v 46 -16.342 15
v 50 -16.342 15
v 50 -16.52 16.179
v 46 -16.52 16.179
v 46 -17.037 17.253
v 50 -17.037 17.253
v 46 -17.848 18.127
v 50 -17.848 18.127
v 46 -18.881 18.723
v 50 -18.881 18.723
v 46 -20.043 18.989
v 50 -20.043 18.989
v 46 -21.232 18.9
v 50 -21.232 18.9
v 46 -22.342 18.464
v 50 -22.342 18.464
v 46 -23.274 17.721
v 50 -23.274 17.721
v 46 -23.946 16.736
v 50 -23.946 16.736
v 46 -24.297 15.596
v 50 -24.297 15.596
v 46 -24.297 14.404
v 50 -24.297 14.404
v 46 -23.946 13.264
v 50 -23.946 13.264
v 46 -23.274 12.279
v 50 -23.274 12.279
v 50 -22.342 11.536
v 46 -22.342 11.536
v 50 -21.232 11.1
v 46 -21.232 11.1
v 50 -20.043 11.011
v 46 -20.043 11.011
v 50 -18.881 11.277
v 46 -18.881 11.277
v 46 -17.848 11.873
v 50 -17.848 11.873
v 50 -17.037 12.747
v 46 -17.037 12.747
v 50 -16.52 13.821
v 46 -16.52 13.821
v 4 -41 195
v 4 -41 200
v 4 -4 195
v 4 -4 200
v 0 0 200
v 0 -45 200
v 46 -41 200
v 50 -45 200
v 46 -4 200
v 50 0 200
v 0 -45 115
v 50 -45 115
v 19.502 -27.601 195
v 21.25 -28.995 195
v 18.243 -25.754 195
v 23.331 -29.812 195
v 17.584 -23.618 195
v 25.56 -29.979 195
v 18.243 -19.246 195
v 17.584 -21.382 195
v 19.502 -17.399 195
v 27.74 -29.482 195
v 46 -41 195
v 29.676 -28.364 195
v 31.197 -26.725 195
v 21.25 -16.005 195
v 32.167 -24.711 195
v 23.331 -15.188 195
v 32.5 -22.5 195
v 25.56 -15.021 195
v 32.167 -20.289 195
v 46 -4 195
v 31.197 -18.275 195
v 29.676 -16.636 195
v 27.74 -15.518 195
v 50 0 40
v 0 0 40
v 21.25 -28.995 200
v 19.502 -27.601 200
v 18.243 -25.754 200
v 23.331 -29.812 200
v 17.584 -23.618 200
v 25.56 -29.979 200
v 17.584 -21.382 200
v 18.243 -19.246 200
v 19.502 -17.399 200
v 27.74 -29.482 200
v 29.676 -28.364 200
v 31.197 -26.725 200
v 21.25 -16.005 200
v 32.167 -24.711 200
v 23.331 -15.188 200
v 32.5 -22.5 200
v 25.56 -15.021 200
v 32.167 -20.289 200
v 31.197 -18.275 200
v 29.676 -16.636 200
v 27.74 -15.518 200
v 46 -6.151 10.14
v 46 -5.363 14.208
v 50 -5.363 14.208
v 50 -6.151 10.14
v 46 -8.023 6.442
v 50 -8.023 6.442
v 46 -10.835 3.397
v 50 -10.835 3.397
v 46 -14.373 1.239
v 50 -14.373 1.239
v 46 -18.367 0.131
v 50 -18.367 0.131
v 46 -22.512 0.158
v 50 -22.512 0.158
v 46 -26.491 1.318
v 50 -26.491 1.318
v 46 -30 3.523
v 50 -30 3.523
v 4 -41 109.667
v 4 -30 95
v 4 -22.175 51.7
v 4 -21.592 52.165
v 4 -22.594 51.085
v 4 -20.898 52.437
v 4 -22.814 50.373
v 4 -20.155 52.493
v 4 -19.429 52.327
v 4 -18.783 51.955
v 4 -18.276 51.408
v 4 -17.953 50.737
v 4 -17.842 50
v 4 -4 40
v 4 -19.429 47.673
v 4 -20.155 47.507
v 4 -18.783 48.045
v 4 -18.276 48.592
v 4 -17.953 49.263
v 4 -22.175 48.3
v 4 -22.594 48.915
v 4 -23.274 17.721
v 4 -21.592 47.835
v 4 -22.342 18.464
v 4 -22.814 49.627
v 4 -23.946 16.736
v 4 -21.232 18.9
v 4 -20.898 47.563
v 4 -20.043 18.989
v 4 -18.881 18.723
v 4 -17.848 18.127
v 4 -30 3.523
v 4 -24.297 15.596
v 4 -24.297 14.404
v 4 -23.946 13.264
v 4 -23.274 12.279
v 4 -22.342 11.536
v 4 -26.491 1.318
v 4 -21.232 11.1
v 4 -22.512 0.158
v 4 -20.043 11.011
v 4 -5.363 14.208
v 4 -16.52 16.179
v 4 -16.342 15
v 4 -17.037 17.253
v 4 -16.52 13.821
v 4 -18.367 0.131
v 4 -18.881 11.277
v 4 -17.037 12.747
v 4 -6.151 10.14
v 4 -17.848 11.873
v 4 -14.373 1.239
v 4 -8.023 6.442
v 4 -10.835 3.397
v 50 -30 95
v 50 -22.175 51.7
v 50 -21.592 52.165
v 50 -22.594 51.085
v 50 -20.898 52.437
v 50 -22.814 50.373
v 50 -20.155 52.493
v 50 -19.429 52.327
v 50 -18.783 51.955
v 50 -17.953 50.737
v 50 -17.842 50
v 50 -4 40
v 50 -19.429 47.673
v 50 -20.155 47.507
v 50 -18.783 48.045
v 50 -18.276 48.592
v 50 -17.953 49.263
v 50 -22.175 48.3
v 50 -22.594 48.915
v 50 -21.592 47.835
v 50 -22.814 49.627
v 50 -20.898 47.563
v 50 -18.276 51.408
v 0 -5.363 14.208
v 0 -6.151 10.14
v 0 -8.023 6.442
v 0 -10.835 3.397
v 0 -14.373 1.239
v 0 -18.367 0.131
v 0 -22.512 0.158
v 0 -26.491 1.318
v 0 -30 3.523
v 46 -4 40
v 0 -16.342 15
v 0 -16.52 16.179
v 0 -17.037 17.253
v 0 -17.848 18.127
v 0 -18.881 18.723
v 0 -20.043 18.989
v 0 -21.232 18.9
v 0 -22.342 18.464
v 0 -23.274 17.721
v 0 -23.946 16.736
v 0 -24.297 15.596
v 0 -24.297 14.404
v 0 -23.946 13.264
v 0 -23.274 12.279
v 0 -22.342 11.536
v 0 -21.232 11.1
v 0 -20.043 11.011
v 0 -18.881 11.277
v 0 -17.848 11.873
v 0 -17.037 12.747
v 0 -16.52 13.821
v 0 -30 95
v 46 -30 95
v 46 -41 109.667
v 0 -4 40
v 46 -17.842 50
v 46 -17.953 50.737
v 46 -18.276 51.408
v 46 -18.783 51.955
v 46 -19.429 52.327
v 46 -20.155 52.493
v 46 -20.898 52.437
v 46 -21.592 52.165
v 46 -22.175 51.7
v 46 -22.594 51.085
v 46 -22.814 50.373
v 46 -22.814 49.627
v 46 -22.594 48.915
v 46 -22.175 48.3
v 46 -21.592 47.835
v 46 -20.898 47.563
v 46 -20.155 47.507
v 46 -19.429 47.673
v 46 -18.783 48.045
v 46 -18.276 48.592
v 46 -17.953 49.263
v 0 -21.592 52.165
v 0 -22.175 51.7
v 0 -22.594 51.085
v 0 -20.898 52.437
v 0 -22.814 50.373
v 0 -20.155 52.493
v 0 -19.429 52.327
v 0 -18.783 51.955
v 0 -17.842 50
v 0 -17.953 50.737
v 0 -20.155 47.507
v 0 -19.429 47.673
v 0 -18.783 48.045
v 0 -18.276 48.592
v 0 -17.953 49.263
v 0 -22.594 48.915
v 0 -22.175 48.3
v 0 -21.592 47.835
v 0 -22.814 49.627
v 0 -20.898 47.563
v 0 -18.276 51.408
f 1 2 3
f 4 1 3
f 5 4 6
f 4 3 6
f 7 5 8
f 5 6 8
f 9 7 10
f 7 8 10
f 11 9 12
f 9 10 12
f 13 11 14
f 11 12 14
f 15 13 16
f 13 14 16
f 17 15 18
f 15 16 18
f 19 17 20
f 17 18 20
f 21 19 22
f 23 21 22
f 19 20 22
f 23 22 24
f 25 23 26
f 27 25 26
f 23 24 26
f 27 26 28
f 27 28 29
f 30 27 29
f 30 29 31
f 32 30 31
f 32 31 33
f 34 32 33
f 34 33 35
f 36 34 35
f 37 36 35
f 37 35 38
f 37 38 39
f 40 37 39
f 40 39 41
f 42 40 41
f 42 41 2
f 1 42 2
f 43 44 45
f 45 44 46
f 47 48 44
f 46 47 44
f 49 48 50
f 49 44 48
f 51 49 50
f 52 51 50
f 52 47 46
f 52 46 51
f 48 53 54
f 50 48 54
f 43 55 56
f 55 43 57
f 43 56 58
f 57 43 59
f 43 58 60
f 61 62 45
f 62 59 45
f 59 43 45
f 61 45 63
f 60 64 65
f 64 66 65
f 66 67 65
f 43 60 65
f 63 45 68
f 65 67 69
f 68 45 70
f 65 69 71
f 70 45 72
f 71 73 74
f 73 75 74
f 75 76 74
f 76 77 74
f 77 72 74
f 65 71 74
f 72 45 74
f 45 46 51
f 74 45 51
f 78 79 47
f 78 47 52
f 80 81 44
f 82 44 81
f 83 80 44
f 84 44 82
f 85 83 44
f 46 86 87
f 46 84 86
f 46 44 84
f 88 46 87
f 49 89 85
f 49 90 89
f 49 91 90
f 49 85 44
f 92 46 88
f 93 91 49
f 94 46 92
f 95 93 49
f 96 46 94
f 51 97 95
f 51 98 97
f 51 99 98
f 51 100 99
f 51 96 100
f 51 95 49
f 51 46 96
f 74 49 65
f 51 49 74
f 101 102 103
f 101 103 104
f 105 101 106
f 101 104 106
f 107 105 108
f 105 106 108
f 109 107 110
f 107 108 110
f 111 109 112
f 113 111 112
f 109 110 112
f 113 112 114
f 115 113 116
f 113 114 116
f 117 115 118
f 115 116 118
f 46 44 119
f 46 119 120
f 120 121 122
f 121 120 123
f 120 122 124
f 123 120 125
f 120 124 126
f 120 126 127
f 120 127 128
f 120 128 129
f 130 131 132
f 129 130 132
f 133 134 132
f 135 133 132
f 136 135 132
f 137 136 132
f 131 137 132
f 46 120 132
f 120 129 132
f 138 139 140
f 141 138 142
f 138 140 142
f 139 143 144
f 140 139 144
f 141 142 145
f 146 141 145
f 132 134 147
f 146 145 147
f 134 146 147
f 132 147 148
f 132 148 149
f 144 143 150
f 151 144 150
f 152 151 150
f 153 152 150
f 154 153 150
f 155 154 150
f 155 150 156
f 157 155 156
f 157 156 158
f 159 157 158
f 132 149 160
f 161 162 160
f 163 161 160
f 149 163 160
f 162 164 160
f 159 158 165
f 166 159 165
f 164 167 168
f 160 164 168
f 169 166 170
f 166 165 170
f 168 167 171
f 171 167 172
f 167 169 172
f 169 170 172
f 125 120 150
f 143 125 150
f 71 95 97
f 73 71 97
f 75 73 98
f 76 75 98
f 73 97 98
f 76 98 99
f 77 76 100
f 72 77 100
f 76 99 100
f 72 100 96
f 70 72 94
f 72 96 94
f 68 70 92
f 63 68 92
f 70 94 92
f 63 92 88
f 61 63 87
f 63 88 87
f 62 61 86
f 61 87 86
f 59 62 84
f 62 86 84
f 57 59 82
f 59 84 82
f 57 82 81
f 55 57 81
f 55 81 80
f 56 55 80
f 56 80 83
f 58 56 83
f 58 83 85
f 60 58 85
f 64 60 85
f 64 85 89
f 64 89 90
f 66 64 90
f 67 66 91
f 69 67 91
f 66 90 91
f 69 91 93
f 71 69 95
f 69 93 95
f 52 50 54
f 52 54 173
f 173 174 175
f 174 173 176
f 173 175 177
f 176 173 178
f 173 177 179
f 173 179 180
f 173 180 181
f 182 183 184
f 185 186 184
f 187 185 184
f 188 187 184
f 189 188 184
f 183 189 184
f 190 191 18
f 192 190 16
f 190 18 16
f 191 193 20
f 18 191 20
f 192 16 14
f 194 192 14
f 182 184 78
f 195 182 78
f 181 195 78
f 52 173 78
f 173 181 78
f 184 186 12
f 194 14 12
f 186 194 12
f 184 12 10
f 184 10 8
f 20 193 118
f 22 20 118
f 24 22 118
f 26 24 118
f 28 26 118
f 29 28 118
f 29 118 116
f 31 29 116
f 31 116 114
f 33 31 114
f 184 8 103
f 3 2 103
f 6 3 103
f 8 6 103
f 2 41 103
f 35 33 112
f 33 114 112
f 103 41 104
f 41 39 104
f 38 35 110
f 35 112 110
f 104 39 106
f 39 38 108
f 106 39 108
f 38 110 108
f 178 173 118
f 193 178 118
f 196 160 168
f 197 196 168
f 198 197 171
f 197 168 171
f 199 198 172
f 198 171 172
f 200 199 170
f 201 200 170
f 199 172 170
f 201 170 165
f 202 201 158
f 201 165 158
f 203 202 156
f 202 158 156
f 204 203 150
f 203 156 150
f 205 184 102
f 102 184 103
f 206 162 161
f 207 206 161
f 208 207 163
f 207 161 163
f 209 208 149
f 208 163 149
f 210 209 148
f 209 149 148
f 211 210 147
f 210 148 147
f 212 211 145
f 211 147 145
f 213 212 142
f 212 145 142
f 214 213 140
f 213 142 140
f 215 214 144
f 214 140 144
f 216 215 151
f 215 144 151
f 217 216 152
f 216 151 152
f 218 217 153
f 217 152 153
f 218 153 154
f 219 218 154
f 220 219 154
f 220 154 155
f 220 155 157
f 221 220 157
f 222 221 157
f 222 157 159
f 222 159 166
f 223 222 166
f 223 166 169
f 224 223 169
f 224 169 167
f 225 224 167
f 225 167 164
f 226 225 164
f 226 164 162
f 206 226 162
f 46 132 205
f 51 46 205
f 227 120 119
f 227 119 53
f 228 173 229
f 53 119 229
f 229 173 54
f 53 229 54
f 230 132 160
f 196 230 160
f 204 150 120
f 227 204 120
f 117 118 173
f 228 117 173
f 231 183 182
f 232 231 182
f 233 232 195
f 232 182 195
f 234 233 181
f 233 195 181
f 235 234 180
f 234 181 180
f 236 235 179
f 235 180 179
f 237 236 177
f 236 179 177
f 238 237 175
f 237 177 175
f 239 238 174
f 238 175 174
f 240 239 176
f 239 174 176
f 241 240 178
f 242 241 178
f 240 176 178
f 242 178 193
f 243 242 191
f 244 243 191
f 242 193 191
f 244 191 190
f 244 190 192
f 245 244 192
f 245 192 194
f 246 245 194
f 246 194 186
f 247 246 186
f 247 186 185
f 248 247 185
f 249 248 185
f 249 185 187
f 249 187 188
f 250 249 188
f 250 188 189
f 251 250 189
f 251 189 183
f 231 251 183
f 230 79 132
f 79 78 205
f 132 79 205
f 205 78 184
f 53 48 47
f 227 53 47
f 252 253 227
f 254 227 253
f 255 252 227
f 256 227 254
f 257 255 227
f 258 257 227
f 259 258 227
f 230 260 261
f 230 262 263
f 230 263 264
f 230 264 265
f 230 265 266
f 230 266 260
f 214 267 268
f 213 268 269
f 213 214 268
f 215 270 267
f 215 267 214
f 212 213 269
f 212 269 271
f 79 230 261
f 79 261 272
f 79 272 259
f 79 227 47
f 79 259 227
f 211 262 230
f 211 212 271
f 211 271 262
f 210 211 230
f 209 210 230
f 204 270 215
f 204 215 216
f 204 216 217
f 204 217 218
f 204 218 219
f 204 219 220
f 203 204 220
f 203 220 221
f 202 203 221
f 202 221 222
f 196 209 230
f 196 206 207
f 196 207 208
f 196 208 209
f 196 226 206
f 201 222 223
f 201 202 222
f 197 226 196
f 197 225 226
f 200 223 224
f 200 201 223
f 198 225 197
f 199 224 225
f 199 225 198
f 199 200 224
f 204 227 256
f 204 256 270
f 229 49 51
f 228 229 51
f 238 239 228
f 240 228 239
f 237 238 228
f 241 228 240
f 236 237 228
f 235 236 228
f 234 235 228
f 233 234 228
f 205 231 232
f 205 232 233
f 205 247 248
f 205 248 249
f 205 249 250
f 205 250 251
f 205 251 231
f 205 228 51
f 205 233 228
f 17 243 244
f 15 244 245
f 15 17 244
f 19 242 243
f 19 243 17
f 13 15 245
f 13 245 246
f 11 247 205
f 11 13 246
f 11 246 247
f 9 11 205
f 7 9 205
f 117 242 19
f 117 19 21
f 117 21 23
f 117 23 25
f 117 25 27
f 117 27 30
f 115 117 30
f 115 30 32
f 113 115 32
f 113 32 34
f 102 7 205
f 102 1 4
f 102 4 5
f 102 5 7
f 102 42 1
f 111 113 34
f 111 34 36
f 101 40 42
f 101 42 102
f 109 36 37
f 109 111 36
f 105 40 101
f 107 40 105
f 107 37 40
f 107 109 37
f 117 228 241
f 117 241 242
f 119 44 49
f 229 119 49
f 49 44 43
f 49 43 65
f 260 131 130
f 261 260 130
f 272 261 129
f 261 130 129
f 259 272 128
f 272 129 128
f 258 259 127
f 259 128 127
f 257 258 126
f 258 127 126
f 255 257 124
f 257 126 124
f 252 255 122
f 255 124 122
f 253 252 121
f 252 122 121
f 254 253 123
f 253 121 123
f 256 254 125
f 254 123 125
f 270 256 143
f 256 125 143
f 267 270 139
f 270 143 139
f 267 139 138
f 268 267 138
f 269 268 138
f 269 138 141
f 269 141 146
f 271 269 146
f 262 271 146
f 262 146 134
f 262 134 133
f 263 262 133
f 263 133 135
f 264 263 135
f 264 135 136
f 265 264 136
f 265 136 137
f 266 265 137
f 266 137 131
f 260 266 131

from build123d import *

# Parameters (mm, degrees)
SKETCH_1_W           = 50
SKETCH_1_H           = 45
SKETCH_1_W_2         = 42
SKETCH_1_H_2         = 37
EXTRUDE_1_DEPTH      = 200
SKETCH_2_OUTSIDE_W   = 244.202
SKETCH_2_OUTSIDE_H   = 89.202
SKETCH_2_OUTSIDE_R   = 2.5
SKETCH_2_OUTSIDE_R_2 = 4
CUT_EXTRUDE_1_DEPTH  = 212.00947846
SKETCH_3_W           = 42
SKETCH_3_H           = 37
SKETCH_3_R           = 7.5
EXTRUDE_2_DEPTH      = 5


with BuildPart() as part:
    # ｽｹｯﾁ1 → ﾎﾞｽ - 押し出し1 (new body)
    with BuildSketch(Plane.XY):
        with Locations((25, -22.5)):
            Rectangle(SKETCH_1_W, SKETCH_1_H)
        with Locations((25, -22.5)):
            Rectangle(SKETCH_1_W_2, SKETCH_1_H_2, mode=Mode.SUBTRACT)
    extrude(amount=EXTRUDE_1_DEPTH)

    # ｽｹｯﾁ2 outside → ｶｯﾄ - 押し出し1 (cut, through all)
    # profile 1 of 3: a face of its own
    with BuildSketch(Plane(origin=(50, 0, 0), x_dir=(0, 0, -1), z_dir=(1, 0, 0))):
        with Locations((-100, -22.5)):
            Rectangle(SKETCH_2_OUTSIDE_W, SKETCH_2_OUTSIDE_H)
        with BuildLine():
            Line((-3.522962143, -30), (-95, -30))
            Line((-95, -30), (-115, -45))
            Line((-115, -45), (-200, -45))
            Line((-200, -45), (-200, 0))
            Line((-200, 0), (-40, 0))
            Line((-40, 0), (-40, -4))
            Line((-40, -4), (-14.208480396, -5.362864969))
            ThreePointArc((-14.208480396, -5.362864969), (-1.238587239, -14.373422856), (-3.522962143, -30))
        make_face(mode=Mode.SUBTRACT)
    # profile 2 of 3: a face of its own
    with BuildSketch(Plane(origin=(50, 0, 0), x_dir=(0, 0, -1), z_dir=(1, 0, 0))):
        with Locations(Location((-50, -20.341966968, 0), (0, 0, 90))):
            Circle(SKETCH_2_OUTSIDE_R)
    # profile 3 of 3: a face of its own
    with BuildSketch(Plane(origin=(50, 0, 0), x_dir=(0, 0, -1), z_dir=(1, 0, 0))):
        with Locations(Location((-15, -20.341966968, 0), (0, 0, 90))):
            Circle(SKETCH_2_OUTSIDE_R_2)
    extrude(amount=-CUT_EXTRUDE_1_DEPTH, mode=Mode.SUBTRACT)


with BuildPart() as body_2:
    # ｽｹｯﾁ3 → ﾎﾞｽ - 押し出し2 (new body)
    with BuildSketch(Plane.XY.offset(200)):
        with Locations((25, -22.5)):
            Rectangle(SKETCH_3_W, SKETCH_3_H)
        with Locations((25, -22.5)):
            Circle(SKETCH_3_R, mode=Mode.SUBTRACT)
    extrude(amount=-EXTRUDE_2_DEPTH)


solid = Compound([part.part, body_2.part])
